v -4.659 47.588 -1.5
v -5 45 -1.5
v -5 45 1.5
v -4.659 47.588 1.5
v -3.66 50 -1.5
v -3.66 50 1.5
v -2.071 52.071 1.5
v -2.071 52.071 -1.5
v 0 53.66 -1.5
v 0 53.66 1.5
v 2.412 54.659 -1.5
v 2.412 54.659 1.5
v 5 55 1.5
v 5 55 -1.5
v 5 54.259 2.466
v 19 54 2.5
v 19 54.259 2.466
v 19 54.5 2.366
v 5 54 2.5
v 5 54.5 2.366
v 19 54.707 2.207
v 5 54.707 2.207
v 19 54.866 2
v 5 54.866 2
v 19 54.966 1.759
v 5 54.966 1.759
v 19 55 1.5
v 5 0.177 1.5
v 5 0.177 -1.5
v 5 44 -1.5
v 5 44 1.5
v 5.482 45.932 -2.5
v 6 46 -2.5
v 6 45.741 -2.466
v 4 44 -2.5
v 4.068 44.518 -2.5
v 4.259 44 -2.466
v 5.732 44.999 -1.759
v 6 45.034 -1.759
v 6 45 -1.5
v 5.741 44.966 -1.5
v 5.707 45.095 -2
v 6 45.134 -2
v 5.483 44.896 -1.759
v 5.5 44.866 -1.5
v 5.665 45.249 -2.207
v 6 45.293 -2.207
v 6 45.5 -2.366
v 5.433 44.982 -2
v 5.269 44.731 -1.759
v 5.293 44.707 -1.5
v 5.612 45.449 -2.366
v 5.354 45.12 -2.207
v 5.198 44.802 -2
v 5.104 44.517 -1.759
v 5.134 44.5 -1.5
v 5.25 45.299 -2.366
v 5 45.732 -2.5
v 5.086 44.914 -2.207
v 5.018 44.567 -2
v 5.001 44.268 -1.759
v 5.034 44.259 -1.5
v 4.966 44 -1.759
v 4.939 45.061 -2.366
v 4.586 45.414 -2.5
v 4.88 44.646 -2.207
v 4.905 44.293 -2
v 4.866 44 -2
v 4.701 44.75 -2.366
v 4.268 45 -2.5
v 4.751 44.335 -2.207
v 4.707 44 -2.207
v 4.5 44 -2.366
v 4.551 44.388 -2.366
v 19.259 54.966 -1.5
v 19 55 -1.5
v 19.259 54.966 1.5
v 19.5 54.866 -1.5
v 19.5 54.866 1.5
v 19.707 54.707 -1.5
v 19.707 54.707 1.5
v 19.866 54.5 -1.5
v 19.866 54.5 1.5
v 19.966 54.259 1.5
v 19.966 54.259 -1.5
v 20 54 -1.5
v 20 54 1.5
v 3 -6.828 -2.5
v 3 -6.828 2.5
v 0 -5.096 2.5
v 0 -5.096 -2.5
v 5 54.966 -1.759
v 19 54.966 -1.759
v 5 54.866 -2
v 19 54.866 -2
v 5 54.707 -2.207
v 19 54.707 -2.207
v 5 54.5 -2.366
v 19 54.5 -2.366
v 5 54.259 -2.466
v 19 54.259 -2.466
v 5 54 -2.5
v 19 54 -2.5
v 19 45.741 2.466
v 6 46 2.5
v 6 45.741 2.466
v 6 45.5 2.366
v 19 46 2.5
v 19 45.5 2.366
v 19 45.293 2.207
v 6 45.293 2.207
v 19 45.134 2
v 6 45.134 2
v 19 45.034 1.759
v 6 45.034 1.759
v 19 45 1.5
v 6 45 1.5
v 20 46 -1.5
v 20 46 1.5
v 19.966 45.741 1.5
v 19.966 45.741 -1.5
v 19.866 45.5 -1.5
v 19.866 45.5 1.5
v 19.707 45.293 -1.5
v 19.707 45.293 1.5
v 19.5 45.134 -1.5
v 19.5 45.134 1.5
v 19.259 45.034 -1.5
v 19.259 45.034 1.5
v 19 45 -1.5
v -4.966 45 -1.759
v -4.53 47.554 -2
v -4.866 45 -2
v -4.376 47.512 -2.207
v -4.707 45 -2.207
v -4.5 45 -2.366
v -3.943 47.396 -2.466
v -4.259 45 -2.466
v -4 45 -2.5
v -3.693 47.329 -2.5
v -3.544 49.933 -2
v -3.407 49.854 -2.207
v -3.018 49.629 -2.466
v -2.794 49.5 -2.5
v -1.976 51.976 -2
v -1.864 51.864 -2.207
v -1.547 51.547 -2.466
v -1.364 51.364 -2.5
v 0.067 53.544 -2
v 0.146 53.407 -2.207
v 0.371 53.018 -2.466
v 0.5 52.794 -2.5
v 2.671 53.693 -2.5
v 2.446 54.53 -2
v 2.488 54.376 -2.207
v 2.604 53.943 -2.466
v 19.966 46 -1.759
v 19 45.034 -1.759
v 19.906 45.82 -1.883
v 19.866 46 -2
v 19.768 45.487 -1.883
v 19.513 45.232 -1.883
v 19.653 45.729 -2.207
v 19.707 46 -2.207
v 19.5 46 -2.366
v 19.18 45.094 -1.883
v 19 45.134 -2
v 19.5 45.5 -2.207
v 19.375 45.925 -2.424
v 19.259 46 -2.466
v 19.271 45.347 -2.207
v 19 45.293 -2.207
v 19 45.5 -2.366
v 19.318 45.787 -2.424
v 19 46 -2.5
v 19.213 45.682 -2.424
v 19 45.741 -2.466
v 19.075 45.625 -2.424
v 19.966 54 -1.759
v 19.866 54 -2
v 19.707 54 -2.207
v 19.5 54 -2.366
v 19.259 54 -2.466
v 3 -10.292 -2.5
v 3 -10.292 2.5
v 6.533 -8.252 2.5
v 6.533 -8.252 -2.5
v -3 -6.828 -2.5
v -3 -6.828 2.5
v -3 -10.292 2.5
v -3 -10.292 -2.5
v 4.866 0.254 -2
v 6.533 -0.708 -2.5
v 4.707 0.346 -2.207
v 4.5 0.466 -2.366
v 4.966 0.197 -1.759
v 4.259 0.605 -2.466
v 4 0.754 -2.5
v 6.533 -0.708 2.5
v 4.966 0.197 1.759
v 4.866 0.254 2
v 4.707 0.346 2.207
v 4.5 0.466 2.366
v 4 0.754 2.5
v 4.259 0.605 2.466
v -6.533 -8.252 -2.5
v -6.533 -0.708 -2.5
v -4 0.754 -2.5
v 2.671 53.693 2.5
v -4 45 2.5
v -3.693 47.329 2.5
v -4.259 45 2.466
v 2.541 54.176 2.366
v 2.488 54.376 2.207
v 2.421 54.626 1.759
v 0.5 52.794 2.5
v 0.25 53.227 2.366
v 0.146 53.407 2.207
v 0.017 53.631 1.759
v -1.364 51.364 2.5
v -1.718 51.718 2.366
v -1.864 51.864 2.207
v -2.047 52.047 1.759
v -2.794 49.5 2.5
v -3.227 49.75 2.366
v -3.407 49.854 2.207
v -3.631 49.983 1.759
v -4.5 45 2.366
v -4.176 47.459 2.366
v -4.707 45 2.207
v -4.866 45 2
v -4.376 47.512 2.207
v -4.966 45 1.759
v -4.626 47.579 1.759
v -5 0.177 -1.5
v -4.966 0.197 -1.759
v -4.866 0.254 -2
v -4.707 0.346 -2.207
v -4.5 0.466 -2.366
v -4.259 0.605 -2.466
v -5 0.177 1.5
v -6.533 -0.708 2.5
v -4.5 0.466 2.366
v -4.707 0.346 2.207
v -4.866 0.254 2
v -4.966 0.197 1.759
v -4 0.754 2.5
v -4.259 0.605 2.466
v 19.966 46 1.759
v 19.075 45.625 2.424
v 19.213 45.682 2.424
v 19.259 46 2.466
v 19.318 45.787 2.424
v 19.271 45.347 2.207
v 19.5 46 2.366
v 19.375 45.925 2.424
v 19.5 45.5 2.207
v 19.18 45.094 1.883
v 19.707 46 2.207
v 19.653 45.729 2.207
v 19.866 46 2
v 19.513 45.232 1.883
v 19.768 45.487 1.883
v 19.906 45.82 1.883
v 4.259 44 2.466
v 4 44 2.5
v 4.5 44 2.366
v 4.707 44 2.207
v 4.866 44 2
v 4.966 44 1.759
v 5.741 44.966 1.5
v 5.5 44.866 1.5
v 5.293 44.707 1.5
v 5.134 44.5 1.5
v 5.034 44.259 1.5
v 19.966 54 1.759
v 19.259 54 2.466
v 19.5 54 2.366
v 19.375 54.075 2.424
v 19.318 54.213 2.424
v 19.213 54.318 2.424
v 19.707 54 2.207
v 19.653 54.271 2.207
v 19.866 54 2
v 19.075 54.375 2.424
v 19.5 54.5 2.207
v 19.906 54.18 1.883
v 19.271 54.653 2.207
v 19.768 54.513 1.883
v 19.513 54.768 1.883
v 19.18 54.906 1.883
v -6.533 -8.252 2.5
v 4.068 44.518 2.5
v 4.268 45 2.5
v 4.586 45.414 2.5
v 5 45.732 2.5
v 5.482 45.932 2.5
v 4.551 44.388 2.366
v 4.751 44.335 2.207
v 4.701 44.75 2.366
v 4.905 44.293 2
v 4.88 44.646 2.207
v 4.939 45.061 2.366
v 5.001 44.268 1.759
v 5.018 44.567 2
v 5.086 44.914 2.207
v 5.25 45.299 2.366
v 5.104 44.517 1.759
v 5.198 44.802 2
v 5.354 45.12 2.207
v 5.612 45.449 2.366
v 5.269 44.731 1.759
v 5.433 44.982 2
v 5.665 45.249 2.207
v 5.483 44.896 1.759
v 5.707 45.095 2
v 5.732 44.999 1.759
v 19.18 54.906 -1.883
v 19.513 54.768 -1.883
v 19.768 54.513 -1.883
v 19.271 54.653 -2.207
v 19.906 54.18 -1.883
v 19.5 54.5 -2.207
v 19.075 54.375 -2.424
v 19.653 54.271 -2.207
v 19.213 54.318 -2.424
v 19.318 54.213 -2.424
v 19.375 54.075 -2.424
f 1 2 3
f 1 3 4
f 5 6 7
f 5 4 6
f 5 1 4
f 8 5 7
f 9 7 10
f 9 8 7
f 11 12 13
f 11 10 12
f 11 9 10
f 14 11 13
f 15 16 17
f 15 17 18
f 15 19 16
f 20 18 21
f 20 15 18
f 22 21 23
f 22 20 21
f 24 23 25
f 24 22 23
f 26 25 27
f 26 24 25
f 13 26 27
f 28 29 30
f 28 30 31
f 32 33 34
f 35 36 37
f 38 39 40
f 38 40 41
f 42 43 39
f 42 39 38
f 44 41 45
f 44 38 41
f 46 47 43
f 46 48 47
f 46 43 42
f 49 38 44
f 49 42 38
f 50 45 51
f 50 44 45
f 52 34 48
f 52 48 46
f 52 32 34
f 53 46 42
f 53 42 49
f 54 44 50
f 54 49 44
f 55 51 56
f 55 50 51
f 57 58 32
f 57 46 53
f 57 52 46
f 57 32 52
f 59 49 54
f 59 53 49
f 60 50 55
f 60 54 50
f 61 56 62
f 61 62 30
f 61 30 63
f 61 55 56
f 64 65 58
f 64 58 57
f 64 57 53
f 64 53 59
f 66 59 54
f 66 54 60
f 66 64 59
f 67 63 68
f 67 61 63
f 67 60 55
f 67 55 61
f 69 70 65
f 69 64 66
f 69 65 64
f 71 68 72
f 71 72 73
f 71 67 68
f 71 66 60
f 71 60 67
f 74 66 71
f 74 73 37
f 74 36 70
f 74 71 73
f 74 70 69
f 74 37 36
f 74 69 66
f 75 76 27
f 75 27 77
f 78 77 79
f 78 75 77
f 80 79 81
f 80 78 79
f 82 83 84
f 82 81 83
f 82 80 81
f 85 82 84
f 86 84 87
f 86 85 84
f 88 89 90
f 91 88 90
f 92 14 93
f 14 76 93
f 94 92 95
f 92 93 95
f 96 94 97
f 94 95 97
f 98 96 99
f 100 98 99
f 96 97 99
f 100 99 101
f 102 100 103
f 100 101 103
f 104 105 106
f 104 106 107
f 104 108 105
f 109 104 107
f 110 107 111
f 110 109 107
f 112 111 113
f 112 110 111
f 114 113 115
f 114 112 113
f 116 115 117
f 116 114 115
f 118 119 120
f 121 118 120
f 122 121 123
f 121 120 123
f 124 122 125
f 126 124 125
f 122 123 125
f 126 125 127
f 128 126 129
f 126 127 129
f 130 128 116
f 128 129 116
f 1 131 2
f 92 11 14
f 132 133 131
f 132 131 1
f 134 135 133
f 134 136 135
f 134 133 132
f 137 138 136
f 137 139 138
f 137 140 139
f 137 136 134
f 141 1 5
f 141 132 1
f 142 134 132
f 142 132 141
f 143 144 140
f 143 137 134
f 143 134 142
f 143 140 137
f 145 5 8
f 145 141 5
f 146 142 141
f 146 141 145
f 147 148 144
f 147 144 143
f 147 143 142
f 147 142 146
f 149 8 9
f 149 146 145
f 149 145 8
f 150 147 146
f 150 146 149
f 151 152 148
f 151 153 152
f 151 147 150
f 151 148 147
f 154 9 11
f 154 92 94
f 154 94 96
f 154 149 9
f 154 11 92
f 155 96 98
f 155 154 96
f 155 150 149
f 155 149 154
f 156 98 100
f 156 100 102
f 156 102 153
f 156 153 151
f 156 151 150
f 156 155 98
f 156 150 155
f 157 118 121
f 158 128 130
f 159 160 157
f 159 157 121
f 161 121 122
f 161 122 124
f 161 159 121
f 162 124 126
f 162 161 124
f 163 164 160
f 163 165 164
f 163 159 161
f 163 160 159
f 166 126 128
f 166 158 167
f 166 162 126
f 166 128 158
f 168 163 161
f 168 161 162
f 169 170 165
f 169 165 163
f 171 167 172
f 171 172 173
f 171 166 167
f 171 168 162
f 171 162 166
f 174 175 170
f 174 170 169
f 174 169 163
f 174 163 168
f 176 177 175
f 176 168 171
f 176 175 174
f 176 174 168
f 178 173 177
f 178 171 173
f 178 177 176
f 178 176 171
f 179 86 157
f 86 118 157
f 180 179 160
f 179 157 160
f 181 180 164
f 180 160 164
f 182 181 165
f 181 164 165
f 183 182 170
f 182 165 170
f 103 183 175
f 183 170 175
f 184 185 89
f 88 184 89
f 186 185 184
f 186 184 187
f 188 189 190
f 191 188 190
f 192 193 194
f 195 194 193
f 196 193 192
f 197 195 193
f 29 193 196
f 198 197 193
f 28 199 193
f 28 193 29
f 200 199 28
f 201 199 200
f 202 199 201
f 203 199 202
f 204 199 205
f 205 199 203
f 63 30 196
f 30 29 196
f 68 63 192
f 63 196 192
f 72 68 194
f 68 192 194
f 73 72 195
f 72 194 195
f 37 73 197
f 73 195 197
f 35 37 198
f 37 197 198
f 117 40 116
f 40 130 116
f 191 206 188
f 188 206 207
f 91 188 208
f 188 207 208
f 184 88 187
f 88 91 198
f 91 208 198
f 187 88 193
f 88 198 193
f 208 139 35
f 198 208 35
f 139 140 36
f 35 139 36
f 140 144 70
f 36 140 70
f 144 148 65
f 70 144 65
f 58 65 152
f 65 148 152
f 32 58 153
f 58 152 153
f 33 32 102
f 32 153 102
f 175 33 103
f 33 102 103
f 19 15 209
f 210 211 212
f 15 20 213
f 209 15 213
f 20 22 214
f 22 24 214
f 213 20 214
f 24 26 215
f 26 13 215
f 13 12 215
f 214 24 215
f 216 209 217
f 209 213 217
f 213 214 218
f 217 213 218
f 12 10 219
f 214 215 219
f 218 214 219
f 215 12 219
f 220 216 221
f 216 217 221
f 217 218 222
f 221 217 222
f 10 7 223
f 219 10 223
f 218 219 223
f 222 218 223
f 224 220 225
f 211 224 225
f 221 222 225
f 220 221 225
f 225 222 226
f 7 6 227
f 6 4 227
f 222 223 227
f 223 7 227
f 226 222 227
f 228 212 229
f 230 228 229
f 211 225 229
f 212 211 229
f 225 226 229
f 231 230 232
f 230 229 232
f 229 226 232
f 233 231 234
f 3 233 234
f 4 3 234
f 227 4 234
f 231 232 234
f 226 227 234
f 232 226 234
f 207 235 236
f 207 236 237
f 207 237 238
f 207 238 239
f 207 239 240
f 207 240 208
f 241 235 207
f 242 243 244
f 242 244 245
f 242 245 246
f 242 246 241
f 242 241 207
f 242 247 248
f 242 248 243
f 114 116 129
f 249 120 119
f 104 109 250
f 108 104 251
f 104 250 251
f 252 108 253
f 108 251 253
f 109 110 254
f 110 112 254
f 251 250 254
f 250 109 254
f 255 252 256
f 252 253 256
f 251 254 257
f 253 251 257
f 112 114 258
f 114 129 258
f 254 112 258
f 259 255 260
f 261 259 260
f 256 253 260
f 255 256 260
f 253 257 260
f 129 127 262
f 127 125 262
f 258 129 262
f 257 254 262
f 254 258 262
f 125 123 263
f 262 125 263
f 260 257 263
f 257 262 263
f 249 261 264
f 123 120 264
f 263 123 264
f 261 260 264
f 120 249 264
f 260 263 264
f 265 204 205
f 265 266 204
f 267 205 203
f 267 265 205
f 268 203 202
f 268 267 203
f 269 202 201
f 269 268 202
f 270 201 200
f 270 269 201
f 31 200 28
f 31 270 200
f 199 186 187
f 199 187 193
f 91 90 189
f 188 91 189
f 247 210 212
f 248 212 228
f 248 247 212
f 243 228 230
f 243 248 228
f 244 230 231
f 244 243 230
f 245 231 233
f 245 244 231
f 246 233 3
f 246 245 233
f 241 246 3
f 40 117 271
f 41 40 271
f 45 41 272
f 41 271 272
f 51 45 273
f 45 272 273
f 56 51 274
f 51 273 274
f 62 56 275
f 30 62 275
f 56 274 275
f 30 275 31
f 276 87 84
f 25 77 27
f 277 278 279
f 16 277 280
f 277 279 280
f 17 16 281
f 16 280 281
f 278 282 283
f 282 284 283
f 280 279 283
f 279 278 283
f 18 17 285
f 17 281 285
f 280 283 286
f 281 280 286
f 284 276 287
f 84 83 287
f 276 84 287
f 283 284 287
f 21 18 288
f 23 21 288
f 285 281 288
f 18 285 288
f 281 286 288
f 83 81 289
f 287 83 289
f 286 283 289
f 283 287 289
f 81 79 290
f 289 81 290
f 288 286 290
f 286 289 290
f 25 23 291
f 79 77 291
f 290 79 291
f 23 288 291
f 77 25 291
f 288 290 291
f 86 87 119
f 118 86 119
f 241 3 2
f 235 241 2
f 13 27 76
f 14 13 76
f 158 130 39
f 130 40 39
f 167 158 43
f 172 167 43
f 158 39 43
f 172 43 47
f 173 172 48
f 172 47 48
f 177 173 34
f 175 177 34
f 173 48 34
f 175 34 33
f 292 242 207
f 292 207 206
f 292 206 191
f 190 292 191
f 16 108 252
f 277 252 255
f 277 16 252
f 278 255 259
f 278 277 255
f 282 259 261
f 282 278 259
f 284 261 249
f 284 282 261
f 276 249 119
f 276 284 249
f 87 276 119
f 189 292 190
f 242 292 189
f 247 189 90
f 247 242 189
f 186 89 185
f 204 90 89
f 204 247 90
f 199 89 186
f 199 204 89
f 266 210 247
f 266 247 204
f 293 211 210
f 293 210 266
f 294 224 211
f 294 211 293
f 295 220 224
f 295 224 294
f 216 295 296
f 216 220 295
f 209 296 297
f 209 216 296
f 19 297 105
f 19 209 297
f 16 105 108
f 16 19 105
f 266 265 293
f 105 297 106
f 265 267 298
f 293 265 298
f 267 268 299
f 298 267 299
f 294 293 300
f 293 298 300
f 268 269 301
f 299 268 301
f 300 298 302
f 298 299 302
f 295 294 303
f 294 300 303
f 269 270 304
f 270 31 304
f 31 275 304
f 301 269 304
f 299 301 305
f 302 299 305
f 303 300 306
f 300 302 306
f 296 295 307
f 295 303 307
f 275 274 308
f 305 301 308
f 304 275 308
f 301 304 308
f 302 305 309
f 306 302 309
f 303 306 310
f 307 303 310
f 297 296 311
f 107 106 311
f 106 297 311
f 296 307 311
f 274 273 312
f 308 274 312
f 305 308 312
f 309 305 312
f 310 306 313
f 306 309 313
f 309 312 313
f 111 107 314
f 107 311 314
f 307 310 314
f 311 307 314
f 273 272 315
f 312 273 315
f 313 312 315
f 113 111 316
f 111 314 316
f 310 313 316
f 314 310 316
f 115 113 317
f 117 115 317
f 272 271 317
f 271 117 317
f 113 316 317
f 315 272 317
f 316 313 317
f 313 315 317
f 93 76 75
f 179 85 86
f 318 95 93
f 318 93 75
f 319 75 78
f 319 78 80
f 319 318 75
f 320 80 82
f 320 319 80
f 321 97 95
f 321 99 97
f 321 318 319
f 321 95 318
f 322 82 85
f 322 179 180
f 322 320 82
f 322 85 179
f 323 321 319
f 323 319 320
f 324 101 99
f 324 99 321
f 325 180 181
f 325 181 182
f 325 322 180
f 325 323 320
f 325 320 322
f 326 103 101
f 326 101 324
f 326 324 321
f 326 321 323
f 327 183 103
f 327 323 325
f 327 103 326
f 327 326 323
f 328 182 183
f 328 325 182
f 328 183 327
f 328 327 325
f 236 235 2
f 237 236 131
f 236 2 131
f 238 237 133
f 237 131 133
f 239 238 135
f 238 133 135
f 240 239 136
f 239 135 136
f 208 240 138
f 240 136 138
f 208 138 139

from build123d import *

# Parameters (mm, degrees)
F0_W     = 10
F0_H     = 5
F4_DEPTH = 5
F6_DEPTH = 5
F7_R     = 1
F8_R     = 1


with BuildPart() as f2:
    # F2: sweep along a path in F1
    with BuildLine(Plane.XY) as f2_path:
        Line((0, 0), (0, 45))
        ThreePointArc((0, 45), (1.4644660941, 48.5355339059), (5, 50))
        Line((5, 50), (20, 50))
    # F0 (on Front) → F2 (sweep)
    with BuildSketch(Plane.XZ):
        Rectangle(F0_W, F0_H)
    sweep(path=f2_path.line)

    # F3 (on face) → F4 (join, through all)
    with BuildSketch(Plane.XY.offset(2.5)):
        Polygon((0, -12.0238676125), (6.5331561742, -8.2519481366), (6.5331561742, -0.708109185), (0, 3.0638102908), (-6.5331561742, -0.708109185), (-6.5331561742, -8.2519481366), align=None)
    extrude(amount=-F4_DEPTH)

    # F5 (on face) → F6 (cut, through all)
    with BuildSketch(Plane.XY.offset(2.5)):
        Polygon((0, -12.0238676125), (3, -10.2918168049), (3, -6.8277151897), (0, -5.0956643822), (-3, -6.8277151897), (-3, -10.2918168049), align=None)
    extrude(amount=-F6_DEPTH, mode=Mode.SUBTRACT)

    # F7
    f7_edges = [f2.edges().sort_by_distance(p)[0] for p in [
        (20, 55, 0),
        (20, 45, 0),
        (5, 45, 0),
    ]]
    fillet(f7_edges, radius=F7_R)

    # F8
    f8_edges = [f2.edges().sort_by_distance(p)[0] for p in [
        (20, 50, 2.5),
        (20, 50, -2.5),
    ]]
    fillet(f8_edges, radius=F8_R)


solid = f2.part
